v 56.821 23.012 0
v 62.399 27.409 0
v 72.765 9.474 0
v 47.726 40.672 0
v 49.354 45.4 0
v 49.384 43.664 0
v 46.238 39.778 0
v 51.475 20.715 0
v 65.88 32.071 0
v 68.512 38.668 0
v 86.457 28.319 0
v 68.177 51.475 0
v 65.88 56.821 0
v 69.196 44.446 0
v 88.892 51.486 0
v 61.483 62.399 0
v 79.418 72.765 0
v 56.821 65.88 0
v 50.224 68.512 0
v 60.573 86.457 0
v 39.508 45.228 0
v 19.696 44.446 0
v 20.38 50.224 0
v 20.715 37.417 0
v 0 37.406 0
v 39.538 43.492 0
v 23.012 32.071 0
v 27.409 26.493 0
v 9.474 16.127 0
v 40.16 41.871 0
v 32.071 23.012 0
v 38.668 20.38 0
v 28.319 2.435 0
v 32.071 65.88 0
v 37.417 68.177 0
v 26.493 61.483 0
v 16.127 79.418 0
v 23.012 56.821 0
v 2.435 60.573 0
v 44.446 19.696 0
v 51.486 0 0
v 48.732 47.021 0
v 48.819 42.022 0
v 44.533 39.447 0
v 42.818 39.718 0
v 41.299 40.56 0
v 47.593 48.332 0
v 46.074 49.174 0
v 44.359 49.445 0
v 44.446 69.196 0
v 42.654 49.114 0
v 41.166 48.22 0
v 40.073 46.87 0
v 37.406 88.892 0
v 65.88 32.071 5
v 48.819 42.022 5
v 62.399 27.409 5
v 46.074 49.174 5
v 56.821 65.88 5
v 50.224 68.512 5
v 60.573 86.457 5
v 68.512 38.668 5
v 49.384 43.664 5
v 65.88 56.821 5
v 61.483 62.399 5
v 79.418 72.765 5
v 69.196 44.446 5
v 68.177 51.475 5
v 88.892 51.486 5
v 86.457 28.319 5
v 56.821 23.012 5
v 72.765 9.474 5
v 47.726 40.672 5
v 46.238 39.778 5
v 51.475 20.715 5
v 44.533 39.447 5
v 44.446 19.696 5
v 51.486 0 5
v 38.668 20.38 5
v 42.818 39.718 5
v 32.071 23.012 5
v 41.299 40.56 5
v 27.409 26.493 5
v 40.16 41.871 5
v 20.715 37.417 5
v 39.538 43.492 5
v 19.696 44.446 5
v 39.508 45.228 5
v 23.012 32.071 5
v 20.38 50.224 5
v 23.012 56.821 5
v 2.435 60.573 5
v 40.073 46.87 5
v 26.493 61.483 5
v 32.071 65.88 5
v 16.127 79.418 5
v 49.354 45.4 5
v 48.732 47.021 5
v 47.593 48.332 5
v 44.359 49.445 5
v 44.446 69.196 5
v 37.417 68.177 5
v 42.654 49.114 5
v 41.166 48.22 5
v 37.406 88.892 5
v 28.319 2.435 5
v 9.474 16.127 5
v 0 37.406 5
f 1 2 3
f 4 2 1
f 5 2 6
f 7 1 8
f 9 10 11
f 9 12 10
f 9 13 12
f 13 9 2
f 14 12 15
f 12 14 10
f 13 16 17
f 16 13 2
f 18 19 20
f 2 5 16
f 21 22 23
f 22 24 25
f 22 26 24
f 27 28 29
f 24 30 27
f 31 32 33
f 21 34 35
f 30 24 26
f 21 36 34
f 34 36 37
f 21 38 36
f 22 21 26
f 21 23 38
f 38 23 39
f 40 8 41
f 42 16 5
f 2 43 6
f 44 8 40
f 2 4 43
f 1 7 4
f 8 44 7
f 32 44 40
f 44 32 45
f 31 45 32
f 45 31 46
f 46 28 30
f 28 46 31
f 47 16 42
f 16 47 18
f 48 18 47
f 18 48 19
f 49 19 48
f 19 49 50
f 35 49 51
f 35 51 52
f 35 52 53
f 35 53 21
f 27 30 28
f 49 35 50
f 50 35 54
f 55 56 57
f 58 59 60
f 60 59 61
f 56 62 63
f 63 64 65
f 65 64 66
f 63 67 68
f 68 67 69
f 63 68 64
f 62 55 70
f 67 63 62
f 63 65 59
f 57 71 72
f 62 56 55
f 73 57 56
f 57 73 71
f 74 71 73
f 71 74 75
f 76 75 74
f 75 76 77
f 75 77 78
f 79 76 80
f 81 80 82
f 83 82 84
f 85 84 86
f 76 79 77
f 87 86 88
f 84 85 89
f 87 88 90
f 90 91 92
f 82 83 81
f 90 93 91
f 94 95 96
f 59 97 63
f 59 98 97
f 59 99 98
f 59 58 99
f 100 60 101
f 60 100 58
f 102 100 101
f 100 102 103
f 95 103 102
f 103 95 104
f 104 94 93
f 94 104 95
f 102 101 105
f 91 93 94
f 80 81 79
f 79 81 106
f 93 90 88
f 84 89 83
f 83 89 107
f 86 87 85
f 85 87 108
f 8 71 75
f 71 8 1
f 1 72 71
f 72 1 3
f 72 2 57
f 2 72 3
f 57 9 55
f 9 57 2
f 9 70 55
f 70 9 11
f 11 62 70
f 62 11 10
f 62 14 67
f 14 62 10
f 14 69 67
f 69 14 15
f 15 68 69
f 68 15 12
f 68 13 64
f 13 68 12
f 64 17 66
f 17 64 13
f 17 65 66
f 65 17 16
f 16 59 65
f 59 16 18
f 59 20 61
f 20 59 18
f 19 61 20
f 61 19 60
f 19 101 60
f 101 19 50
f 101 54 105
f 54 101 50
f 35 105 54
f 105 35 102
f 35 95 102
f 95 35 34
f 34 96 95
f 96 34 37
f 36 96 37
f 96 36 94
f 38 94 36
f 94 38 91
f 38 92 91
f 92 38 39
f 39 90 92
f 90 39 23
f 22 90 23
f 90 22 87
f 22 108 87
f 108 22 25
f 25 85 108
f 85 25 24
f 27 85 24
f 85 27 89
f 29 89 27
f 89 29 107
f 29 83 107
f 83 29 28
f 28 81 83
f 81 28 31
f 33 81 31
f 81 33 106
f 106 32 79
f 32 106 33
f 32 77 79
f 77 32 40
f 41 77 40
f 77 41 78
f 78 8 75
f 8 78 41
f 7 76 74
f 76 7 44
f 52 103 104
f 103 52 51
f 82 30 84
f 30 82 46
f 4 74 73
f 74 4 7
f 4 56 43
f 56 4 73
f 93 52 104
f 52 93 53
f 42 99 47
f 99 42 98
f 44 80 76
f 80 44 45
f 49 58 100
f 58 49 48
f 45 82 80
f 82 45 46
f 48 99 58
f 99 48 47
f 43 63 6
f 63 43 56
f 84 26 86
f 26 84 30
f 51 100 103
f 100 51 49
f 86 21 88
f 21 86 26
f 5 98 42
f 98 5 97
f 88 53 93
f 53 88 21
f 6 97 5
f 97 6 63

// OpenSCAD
$fn = 32;

// ----------------------------------------------------------------------
// Star wheel: 12-point ratchet, R45
// ----------------------------------------------------------------------

// --- parameters (mm) ---
n_points = 12;            // number of points / teeth
r_out = 45;               // tip radius
r_in = 24.75;             // root radius
bore_r = 5;               // centre bore radius
plate_t = 5;              // plate thickness, Z (extrusion height)
bore_d = 10;              // centre bore diameter

profile = [[69.196, 44.446], [88.892, 51.486], [68.177, 51.475], [65.88, 56.821], [79.418, 72.765], [61.483, 62.399], [56.821, 65.88], [60.573, 86.457], [50.224, 68.512], [44.446, 69.196], [37.406, 88.892], [37.417, 68.177], [32.071, 65.88], [16.127, 79.418], [26.493, 61.483], [23.012, 56.821], [2.435, 60.573], [20.38, 50.224], [19.696, 44.446], [0, 37.406], [20.715, 37.417], [23.012, 32.071], [9.474, 16.127], [27.409, 26.493], [32.071, 23.012], [28.319, 2.435], [38.668, 20.38], [44.446, 19.696], [51.486, 0], [51.475, 20.715], [56.821, 23.012], [72.765, 9.474], [62.399, 27.409], [65.88, 32.071], [86.457, 28.319], [68.512, 38.668]];  // primary outline, 36 points, counter clockwise
void_1 = [[49.354, 45.4], [48.732, 47.021], [47.593, 48.332], [46.074, 49.174], [44.359, 49.445], [42.654, 49.114], [41.166, 48.22], [40.073, 46.87], [39.508, 45.228], [39.538, 43.492], [40.16, 41.871], [41.299, 40.56], [42.818, 39.718], [44.533, 39.447], [46.238, 39.778], [47.726, 40.672], [48.819, 42.022], [49.384, 43.664]];  // centre bore, 18 points

// --- the one profile operation ---
difference() {
  linear_extrude(height = plate_t) polygon(points = profile);
  translate([0, 0, -1])
    linear_extrude(height = plate_t + 2) polygon(points = void_1);
}
